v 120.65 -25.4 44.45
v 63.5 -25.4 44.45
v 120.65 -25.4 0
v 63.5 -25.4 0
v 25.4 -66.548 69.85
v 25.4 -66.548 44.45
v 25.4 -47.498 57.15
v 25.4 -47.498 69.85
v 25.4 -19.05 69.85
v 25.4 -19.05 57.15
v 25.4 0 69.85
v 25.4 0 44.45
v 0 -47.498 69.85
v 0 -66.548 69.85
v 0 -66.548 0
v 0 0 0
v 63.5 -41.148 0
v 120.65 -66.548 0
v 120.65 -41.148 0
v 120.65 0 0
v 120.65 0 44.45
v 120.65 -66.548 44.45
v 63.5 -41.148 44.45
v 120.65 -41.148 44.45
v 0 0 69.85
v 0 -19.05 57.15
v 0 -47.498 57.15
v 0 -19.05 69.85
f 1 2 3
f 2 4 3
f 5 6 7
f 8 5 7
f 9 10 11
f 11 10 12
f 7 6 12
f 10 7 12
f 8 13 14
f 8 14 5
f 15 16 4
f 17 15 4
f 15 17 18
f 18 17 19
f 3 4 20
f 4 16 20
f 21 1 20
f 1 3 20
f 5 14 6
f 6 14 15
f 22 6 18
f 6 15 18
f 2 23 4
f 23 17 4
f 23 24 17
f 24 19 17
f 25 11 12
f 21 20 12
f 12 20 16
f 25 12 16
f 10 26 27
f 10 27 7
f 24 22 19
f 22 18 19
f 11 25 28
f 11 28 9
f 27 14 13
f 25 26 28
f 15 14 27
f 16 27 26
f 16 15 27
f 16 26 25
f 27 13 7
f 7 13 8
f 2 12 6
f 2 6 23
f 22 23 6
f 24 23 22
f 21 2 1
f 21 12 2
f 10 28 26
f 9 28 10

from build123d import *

# Parameters (mm, degrees)
F0_W      = 120.65
F0_H      = 66.548
F1_DEPTH  = 19.05
F2_W      = 25.4
F2_H      = 44.45
F3_DEPTH  = 66.548
F4_W      = 25.4
F4_H      = 66.548
F5_DEPTH  = 25.4
F6_W      = 25.4
F6_H      = 28.0485648255
F7_DEPTH  = 12.7
F8_W      = 25.4
F8_H      = 28.448
F9_DEPTH  = 12.7
F10_W     = 57.15
F10_H     = 15.748
F11_DEPTH = 25.4
F13_DEPTH = 25.4


with BuildPart() as f1:
    # F0 (on Top) → F1 (new body)
    with BuildSketch(Plane.XY):
        with Locations((60.325, -33.274)):
            Rectangle(F0_W, F0_H)
    extrude(amount=F1_DEPTH)

    # F2 (on face) → F3 (join)
    with BuildSketch(Plane.XZ.offset(66.548)):
        with Locations((12.7, 22.225)):
            Rectangle(F2_W, F2_H)
    extrude(amount=-F3_DEPTH)

    # F4 (on face) → F5 (join)
    with BuildSketch(Plane.XY.offset(44.45)):
        with Locations((12.7, -33.274)):
            Rectangle(F4_W, F4_H)
    extrude(amount=F5_DEPTH)

    # F6 (on face) → F7 (join)
    with BuildSketch(Plane.XY.offset(69.85)):
        with Locations((12.7, -33.4737175872)):
            Rectangle(F6_W, F6_H)
    extrude(amount=-F7_DEPTH)

    # F8 (on face) → F9 (cut)
    with BuildSketch(Plane.XY.offset(69.85)):
        with Locations((12.7, -33.274)):
            Rectangle(F8_W, F8_H)
    extrude(amount=-F9_DEPTH, mode=Mode.SUBTRACT)

    # F10 (on face) → F11 (cut)
    with BuildSketch(Plane.XY.offset(19.05)):
        with Locations((92.075, -33.274)):
            Rectangle(F10_W, F10_H)
    extrude(amount=-F11_DEPTH, mode=Mode.SUBTRACT)

    # F12 (on face) → F13 (join)
    with BuildSketch(Plane.XY.offset(19.05)):
        Polygon((88.9, 0), (25.4, 0), (25.4, -66.548), (120.65, -66.548), (120.65, -41.148), (63.5, -41.148), (63.5, -25.4), (120.65, -25.4), (120.65, 0), align=None)
    extrude(amount=F13_DEPTH)


solid = f1.part
